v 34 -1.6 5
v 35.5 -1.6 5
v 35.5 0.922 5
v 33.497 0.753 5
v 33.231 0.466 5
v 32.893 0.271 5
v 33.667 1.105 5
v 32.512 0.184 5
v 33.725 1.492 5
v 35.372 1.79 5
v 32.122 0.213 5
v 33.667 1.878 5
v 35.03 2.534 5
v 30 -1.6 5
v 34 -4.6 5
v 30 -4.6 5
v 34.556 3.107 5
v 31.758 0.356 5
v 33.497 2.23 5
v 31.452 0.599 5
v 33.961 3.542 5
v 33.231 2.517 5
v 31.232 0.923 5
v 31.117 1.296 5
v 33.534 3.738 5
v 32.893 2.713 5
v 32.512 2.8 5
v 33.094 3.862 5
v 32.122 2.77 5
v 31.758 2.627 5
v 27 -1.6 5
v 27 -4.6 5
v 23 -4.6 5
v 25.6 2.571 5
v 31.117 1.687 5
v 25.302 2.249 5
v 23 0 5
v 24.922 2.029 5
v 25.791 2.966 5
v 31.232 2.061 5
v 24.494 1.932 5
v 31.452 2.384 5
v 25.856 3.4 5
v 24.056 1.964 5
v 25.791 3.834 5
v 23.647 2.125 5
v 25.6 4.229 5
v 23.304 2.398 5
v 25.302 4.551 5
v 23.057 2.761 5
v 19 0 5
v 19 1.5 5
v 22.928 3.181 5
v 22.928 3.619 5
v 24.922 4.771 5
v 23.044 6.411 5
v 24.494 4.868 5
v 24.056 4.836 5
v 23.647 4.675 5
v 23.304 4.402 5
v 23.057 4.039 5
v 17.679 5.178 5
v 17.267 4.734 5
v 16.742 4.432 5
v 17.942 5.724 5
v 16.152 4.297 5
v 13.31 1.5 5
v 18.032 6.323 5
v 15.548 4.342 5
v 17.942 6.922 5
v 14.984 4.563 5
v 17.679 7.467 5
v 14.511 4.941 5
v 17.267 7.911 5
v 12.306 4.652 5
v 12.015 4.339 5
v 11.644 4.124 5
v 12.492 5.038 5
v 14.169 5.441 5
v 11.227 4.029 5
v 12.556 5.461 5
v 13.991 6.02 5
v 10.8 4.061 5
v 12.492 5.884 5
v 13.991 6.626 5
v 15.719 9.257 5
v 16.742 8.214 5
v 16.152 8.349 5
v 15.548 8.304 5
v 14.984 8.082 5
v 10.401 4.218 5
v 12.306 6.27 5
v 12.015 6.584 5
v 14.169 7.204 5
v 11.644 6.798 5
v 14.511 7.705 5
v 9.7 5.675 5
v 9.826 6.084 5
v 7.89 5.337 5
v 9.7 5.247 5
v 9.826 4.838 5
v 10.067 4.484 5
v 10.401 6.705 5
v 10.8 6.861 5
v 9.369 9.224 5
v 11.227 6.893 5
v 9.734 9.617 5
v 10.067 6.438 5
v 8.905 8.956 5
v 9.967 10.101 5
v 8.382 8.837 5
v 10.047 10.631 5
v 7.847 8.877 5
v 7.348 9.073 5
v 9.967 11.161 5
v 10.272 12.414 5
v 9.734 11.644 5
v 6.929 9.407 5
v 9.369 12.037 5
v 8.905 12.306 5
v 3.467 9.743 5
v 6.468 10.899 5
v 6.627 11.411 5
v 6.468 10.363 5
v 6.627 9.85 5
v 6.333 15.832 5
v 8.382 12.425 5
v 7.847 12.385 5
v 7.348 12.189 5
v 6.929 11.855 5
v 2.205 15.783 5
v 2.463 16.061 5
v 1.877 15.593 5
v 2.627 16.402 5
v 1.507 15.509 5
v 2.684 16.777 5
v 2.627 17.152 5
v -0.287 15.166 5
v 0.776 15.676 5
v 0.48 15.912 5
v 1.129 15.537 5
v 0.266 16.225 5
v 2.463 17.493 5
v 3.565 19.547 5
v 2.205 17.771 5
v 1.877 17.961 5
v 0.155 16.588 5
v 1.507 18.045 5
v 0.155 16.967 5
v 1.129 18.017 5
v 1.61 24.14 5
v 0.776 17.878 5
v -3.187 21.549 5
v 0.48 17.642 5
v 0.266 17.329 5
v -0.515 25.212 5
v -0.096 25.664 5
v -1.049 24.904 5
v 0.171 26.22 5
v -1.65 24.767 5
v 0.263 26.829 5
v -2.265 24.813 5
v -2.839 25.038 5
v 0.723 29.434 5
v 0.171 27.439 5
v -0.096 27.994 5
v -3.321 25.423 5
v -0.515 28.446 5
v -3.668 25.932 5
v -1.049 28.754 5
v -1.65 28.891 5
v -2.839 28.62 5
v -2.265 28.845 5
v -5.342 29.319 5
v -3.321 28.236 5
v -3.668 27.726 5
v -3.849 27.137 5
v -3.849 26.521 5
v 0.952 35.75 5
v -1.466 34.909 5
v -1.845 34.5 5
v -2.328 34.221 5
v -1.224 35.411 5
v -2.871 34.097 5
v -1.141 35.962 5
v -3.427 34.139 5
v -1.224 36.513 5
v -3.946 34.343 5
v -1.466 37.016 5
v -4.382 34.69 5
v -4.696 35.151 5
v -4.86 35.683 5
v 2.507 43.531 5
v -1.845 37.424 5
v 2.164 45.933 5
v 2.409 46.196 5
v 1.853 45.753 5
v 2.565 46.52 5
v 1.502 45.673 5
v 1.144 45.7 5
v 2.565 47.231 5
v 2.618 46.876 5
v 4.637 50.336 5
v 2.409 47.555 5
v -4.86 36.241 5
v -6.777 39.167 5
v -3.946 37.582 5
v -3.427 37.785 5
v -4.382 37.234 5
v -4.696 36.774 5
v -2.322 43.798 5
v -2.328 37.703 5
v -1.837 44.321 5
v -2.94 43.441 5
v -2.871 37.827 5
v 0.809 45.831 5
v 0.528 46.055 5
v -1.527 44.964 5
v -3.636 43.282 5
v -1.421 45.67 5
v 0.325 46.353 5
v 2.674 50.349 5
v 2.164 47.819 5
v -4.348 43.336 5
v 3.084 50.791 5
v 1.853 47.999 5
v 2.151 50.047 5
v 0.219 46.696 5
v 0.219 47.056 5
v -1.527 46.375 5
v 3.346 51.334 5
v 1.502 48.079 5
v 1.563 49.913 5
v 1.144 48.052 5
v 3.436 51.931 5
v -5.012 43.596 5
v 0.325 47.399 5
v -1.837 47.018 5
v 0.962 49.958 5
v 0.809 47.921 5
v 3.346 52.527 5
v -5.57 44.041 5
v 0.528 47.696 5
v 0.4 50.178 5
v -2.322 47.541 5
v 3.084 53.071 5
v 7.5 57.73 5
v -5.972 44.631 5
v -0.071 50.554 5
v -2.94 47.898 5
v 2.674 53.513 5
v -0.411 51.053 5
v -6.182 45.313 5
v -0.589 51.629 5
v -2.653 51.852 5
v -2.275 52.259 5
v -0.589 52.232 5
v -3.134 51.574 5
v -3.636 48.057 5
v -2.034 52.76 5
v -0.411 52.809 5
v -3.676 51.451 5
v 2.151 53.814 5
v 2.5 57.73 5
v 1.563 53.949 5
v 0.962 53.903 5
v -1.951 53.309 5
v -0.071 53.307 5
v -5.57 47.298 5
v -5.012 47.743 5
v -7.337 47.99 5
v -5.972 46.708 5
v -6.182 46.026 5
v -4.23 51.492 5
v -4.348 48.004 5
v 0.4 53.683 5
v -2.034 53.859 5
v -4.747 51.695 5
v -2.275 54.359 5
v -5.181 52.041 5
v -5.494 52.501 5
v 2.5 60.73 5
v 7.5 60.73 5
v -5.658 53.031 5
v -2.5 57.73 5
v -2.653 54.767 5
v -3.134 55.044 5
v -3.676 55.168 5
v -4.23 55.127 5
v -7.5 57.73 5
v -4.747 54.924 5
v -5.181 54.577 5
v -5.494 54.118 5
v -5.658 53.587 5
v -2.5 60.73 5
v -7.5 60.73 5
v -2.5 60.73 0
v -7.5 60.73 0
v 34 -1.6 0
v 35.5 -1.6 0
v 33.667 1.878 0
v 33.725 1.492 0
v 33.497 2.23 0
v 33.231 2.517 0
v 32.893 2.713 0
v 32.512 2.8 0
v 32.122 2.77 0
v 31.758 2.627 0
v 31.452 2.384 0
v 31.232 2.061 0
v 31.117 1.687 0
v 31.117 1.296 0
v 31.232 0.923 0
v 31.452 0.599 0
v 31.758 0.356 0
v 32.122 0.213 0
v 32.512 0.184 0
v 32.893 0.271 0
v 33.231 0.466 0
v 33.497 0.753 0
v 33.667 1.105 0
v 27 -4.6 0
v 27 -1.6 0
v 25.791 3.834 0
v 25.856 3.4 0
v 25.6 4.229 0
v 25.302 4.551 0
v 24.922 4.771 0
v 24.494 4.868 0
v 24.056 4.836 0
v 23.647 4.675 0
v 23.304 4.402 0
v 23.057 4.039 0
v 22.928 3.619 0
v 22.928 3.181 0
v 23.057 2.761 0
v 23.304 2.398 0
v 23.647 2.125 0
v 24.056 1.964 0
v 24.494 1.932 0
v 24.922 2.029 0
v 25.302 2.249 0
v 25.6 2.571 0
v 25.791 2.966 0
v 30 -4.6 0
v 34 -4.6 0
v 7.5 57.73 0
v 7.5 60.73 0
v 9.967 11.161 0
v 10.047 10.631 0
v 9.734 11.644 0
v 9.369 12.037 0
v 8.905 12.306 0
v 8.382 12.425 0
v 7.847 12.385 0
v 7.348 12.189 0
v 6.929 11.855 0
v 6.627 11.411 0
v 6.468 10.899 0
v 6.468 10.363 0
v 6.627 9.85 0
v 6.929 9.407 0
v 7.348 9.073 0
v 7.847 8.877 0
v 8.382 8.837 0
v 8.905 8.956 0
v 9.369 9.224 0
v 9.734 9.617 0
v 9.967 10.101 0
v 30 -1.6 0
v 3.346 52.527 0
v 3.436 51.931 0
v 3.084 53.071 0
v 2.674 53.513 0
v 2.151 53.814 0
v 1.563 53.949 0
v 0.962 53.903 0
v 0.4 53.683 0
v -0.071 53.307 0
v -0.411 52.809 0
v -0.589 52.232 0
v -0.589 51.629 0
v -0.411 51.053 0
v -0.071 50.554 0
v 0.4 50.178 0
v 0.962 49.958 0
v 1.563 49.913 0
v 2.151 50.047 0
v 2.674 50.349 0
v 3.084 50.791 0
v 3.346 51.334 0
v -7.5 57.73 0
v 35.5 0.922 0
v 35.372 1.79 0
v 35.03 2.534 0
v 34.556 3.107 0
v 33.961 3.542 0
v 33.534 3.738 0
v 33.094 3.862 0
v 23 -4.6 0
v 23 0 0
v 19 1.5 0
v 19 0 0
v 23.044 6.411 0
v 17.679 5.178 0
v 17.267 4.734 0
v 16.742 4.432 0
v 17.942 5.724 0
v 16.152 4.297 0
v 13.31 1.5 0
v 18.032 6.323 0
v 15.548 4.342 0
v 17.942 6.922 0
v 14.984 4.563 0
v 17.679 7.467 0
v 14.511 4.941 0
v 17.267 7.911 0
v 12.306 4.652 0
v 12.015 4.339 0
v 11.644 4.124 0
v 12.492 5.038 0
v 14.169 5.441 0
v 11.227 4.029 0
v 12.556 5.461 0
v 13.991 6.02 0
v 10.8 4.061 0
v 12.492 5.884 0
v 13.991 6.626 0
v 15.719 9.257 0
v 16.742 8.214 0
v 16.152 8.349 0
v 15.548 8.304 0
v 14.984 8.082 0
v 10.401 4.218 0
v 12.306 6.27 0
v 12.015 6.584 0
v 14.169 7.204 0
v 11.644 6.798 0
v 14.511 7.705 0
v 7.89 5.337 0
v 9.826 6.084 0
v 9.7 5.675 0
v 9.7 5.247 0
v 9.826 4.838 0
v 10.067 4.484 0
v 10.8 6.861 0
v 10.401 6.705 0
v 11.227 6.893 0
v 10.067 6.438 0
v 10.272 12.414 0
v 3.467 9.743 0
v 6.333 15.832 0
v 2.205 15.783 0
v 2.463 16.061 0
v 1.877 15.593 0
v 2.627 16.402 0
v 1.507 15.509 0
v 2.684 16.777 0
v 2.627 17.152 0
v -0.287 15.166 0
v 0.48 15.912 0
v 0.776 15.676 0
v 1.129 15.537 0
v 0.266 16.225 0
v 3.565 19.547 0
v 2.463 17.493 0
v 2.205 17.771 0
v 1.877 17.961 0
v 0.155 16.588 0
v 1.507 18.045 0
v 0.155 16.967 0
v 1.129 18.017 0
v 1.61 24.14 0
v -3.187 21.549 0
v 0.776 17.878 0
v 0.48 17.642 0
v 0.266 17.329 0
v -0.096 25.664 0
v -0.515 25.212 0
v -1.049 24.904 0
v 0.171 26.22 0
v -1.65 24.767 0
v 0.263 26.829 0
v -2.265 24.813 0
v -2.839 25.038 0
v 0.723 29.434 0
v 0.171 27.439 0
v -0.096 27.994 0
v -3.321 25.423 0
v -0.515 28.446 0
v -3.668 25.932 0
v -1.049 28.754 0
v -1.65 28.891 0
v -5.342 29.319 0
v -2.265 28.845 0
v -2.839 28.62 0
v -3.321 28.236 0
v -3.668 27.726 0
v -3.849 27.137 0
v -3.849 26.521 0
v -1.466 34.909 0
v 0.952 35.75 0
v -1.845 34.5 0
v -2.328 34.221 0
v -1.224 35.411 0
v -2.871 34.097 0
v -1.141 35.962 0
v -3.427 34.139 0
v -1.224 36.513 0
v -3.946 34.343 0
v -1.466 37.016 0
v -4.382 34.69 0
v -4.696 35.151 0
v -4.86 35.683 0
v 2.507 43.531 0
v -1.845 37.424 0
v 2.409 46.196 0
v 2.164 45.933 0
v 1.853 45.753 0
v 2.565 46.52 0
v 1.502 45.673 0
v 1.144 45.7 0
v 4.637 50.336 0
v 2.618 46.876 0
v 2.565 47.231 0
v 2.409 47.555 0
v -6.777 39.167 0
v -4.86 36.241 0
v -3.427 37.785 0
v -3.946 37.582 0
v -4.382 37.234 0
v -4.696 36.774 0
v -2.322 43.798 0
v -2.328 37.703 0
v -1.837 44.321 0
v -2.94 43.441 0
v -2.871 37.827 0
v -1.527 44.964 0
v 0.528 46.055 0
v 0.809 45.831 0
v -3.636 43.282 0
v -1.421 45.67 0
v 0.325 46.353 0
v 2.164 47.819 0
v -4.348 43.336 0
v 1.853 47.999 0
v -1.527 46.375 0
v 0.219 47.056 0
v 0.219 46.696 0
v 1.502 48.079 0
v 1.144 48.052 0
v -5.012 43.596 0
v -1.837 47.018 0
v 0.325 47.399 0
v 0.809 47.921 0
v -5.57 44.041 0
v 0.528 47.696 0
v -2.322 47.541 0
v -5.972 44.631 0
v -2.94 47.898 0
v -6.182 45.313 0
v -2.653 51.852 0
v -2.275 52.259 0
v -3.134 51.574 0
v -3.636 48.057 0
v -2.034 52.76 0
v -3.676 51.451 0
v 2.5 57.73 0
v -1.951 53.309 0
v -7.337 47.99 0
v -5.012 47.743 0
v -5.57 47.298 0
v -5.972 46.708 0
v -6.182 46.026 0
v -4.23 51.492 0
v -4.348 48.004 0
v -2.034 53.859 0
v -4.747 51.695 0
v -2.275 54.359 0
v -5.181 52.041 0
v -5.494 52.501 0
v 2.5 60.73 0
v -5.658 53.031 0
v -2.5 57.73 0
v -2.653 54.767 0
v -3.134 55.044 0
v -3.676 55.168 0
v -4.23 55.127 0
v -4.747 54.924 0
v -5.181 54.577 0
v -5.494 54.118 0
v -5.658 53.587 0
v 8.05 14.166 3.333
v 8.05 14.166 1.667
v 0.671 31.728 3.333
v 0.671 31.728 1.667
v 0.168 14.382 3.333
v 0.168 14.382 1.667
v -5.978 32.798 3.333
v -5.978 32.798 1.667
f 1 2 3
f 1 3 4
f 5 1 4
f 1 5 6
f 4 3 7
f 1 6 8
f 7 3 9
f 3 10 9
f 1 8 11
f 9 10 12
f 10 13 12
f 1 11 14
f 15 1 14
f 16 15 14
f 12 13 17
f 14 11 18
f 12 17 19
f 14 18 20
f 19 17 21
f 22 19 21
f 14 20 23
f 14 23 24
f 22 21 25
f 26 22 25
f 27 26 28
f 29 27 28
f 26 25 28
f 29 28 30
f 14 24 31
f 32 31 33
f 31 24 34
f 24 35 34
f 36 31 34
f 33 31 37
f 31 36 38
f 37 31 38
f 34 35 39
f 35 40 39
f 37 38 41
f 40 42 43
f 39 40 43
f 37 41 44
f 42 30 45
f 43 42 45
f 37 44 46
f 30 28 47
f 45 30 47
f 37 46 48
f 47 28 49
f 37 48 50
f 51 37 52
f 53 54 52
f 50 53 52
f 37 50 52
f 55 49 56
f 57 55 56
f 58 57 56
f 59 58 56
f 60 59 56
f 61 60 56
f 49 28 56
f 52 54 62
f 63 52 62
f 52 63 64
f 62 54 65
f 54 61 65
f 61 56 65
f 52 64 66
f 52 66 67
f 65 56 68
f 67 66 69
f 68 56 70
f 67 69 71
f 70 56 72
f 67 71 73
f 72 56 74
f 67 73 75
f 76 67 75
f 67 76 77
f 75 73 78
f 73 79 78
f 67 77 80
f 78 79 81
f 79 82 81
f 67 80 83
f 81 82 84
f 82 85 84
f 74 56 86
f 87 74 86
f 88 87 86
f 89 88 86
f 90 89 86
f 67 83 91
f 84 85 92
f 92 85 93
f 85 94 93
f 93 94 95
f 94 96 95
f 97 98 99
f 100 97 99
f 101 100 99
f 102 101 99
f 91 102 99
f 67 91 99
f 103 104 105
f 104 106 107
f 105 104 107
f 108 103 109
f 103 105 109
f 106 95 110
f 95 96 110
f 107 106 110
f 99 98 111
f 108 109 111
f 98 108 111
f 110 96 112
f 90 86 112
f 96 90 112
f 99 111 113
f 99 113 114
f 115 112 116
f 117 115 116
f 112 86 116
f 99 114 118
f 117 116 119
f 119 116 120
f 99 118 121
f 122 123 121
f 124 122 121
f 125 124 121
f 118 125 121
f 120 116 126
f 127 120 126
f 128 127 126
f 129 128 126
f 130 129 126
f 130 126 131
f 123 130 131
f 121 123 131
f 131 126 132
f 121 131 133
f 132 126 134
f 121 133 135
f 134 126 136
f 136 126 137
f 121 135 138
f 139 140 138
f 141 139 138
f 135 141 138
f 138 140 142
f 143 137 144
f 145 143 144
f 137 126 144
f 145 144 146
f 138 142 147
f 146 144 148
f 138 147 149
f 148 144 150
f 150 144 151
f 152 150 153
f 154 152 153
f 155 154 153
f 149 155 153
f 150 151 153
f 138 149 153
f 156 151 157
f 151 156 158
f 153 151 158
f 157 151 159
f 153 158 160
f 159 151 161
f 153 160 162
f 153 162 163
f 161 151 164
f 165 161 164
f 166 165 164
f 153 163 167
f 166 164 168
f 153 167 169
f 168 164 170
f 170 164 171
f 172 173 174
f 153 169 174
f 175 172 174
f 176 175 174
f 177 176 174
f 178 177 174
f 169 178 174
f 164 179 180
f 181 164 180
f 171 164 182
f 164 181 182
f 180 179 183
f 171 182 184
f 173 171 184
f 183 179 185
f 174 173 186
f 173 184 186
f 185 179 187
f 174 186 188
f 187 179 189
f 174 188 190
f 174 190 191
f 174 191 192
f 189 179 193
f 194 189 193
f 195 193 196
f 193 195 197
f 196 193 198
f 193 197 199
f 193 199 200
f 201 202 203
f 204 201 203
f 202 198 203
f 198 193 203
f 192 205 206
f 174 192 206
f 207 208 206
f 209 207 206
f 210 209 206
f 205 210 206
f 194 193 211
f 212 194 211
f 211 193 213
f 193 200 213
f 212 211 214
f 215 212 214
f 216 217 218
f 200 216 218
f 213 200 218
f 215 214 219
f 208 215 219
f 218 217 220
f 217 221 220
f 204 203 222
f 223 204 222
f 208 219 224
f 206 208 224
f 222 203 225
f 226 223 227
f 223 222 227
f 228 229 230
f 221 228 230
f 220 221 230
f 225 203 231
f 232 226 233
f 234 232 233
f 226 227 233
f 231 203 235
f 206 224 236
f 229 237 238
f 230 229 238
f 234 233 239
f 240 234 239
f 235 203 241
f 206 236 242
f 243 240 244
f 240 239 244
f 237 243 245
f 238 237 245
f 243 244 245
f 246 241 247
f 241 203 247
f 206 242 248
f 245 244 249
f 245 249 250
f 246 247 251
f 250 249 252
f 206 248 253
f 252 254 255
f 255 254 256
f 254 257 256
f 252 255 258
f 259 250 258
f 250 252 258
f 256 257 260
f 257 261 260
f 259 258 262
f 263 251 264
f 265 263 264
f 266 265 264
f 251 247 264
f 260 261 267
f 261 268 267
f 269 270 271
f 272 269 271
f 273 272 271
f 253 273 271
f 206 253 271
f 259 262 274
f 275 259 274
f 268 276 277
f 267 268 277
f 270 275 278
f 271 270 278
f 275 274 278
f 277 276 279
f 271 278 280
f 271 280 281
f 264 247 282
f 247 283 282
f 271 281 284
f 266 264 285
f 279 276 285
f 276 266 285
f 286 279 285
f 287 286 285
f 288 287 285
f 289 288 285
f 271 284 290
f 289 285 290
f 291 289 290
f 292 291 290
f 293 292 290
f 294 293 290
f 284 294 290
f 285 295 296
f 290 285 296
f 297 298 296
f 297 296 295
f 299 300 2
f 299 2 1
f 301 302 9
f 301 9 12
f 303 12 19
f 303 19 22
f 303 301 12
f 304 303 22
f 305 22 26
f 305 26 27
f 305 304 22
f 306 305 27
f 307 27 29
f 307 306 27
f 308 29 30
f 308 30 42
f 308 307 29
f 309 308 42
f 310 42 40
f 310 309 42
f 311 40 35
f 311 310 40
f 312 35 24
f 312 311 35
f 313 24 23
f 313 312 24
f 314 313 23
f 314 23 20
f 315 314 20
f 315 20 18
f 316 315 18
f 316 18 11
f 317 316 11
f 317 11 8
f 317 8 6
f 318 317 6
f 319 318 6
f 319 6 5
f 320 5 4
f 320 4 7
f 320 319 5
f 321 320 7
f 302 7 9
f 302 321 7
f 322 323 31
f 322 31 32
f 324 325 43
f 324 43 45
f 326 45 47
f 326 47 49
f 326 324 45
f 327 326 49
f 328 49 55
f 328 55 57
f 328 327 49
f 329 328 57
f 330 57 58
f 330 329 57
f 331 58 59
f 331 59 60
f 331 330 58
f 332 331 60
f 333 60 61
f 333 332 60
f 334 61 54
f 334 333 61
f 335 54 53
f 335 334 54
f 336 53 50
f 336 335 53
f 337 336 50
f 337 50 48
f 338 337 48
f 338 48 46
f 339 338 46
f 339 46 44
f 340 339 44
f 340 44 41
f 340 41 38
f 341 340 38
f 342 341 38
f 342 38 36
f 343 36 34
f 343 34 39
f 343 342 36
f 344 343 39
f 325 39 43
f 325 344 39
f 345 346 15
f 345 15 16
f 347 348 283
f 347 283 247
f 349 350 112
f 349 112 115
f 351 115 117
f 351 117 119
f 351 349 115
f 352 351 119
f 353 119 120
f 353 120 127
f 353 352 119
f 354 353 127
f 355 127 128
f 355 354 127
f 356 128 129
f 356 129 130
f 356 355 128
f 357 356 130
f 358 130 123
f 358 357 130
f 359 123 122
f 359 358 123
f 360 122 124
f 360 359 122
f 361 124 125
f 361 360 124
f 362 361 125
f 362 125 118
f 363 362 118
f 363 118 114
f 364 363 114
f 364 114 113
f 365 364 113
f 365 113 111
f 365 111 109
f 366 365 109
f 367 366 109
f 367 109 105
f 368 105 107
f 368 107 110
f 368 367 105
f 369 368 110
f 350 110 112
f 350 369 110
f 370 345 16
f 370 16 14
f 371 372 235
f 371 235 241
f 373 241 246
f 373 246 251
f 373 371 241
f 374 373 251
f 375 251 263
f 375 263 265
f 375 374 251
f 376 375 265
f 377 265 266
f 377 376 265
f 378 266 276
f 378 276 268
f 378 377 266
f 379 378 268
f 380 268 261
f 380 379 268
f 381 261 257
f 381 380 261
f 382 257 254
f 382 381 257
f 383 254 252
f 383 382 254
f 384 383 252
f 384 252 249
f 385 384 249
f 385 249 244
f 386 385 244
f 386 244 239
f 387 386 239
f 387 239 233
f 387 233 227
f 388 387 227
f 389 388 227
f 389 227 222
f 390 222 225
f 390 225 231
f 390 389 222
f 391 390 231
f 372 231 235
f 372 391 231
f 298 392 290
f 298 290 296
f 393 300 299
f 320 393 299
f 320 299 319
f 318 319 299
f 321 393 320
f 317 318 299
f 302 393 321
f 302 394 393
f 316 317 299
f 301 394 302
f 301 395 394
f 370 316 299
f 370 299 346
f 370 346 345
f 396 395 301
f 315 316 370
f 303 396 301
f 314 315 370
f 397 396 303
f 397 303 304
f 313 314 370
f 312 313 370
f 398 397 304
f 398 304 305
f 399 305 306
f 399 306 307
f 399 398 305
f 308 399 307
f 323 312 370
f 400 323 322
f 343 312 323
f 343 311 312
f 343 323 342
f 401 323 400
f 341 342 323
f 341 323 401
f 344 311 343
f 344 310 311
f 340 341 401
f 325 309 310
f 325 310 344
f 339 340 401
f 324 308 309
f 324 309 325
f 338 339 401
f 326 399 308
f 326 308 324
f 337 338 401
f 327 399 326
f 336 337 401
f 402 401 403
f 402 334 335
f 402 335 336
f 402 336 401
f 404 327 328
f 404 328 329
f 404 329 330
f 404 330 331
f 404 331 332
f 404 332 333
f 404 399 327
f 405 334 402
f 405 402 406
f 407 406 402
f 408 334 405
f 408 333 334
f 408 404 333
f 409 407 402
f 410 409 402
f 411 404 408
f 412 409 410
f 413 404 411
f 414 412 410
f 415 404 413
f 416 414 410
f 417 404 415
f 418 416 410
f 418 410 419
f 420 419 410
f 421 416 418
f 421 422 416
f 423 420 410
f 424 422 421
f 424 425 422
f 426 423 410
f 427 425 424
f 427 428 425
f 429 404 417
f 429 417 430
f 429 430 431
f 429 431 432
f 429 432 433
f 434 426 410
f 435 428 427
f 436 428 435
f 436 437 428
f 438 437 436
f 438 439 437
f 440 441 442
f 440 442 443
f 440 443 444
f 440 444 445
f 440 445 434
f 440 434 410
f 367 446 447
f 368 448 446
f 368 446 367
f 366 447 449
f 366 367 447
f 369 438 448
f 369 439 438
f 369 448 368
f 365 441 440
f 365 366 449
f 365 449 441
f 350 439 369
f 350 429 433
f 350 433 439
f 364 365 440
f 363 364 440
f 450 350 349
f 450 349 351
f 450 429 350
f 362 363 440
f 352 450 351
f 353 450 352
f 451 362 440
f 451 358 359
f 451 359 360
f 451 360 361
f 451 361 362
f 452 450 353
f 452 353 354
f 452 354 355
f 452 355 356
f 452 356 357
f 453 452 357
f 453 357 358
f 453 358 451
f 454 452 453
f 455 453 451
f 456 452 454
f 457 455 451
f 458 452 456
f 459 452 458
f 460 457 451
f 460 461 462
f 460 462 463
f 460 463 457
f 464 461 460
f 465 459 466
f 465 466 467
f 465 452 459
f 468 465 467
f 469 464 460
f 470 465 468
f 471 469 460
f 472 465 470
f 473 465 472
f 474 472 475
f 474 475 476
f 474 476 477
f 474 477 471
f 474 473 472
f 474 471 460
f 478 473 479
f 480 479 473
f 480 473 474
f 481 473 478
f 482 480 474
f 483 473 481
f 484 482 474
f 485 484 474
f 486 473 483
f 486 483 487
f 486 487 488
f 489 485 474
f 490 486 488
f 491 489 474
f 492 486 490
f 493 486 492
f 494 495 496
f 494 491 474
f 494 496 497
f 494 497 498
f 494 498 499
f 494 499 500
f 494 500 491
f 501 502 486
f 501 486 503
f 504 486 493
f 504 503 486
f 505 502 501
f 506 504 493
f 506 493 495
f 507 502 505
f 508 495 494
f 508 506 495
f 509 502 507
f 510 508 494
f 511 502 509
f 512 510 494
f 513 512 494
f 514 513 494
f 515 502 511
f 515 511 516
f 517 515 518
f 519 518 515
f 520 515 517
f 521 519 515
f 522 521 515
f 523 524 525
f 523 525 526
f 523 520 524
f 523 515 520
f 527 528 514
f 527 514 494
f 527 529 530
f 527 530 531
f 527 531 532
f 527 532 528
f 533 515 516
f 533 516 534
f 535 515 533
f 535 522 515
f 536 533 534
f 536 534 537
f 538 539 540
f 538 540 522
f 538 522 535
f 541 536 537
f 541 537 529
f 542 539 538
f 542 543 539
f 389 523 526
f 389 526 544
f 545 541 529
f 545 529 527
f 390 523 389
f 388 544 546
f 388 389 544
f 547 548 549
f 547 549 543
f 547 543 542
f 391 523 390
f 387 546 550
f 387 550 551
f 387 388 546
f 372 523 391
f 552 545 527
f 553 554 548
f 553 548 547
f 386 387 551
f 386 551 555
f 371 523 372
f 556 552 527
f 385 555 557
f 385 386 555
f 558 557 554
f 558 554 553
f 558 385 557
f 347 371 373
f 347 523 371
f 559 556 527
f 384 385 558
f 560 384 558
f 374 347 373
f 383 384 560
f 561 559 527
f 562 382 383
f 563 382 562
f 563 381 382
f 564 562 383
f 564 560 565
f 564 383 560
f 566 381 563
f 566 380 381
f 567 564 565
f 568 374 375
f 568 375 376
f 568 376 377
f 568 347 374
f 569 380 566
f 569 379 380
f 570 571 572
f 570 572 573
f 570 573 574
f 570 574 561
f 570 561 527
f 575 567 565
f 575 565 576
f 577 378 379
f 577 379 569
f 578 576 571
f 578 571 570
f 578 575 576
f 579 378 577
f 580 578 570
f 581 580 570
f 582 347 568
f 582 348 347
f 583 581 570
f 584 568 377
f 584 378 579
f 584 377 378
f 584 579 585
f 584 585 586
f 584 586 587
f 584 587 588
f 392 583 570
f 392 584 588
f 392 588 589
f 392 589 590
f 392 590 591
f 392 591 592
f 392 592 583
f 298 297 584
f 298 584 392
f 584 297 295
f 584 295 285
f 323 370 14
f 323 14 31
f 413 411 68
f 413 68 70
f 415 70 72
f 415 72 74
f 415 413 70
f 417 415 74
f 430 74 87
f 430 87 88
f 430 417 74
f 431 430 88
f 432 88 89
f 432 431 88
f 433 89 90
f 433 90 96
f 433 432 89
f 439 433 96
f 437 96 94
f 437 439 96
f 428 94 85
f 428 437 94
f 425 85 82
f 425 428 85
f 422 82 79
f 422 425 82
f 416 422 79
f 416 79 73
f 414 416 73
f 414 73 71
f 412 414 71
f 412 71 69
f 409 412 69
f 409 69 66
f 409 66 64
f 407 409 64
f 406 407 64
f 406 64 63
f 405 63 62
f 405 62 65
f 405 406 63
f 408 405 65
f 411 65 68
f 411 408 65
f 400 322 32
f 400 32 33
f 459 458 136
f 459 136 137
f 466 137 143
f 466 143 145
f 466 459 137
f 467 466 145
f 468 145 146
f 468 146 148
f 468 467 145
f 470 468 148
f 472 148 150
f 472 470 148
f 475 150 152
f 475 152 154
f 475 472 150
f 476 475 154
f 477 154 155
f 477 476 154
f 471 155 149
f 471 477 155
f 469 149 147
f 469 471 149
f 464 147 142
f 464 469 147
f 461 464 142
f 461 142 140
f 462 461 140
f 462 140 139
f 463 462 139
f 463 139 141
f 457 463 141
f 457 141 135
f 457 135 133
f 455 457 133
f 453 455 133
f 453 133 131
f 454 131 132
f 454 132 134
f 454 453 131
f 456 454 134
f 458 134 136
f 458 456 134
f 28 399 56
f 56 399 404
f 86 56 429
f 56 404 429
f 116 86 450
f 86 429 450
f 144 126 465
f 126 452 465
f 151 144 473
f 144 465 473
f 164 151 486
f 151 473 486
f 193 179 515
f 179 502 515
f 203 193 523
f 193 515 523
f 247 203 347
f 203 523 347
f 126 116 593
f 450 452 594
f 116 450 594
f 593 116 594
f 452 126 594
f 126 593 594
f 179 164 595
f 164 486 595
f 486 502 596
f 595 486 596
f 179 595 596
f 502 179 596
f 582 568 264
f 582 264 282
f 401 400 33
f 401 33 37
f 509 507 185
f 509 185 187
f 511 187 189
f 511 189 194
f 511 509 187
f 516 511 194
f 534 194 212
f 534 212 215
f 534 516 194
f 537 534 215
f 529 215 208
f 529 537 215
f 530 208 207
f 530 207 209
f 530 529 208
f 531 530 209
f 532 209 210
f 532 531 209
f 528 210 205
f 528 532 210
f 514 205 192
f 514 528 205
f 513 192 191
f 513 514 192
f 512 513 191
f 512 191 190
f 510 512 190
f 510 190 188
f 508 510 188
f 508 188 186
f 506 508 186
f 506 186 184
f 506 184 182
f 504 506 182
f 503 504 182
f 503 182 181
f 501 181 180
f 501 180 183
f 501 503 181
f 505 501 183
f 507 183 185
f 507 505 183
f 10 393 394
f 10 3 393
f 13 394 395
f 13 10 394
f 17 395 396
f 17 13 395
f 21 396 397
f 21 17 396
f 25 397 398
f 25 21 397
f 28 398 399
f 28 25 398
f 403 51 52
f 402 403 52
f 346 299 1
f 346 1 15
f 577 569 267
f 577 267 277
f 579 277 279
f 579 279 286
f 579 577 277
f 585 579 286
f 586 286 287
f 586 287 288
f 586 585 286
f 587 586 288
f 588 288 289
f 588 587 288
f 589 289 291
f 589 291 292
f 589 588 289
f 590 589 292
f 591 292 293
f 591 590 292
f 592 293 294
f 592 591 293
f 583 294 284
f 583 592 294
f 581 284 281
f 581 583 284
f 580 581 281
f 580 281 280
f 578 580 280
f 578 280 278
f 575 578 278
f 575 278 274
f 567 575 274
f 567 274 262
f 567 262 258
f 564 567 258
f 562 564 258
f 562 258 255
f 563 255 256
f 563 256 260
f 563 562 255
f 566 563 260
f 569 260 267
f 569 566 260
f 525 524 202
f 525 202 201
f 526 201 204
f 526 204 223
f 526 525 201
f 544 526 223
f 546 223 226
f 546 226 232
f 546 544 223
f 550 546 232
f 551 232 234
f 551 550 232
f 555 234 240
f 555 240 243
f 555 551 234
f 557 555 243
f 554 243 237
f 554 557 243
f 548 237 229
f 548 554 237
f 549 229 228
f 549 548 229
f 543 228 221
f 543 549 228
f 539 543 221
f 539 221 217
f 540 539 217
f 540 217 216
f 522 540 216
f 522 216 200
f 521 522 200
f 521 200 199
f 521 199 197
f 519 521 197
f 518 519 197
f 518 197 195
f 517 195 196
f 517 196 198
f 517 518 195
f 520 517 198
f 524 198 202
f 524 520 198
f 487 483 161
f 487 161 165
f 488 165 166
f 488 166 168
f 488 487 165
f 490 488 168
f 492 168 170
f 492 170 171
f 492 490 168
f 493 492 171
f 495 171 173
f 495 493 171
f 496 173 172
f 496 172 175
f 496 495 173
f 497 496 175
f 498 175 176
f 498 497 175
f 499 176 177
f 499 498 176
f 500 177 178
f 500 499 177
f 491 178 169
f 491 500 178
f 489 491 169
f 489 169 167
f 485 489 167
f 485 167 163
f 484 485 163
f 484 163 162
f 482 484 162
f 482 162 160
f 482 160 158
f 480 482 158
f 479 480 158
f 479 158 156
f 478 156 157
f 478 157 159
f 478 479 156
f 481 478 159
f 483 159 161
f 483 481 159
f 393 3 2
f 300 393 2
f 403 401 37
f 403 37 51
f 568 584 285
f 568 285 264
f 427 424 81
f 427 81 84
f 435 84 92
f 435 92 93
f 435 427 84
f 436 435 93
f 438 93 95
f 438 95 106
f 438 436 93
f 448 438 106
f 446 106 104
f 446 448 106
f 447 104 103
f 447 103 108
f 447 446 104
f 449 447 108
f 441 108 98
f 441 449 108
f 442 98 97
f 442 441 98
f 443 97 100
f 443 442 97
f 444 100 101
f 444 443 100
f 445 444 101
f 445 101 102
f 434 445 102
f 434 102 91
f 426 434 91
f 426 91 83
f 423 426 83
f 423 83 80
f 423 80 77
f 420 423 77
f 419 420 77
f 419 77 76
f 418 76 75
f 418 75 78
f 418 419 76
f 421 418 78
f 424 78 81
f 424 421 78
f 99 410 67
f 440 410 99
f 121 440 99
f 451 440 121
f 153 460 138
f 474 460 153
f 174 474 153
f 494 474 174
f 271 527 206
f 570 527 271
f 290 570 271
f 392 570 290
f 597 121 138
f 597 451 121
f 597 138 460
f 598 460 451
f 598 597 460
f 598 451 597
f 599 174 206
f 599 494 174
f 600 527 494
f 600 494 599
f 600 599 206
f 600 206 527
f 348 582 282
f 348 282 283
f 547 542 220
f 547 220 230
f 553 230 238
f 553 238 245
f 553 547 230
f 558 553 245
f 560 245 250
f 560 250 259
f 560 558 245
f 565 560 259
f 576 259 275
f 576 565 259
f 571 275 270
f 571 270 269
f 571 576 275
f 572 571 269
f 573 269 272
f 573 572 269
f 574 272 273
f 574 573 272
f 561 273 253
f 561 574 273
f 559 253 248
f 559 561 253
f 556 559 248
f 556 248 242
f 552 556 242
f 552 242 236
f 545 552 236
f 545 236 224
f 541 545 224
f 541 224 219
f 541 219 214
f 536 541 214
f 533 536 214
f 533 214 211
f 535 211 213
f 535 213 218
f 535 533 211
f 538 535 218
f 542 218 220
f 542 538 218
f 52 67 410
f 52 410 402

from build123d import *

# Parameters (mm, degrees)
ESQUISSE3_R             = 1.863947
ESQUISSE3_R_2           = 2.023509578
ESQUISSE3_R_3           = 2.393973193
ESQUISSE3_R_4           = 1.206253728
ESQUISSE3_R_5           = 1.870132193
ESQUISSE3_R_6           = 2.067863533
ESQUISSE3_R_7           = 1.271503072
ESQUISSE3_R_8           = 1.799094092
ESQUISSE3_R_9           = 1.436016343
ESQUISSE3_R_10          = 2.031777992
ESQUISSE3_R_11          = 1.472480674
ESQUISSE3_R_12          = 1.31161039
BOSS_EXTRU_1_DEPTH      = 5
ESQUISSE4_W             = 5.690326356
ESQUISSE4_H             = 1.5
ENL_V_MAT_EXTRU_1_DEPTH = 71.522215792
CONG_1_R                = 3


with BuildPart() as part:
    # Esquisse3 → Boss.-Extru.1 (new body)
    with BuildSketch(Plane.XY):
        with BuildLine():
            Line((30, -4.6), (30, -1.6))
            Line((30, -1.6), (27, -1.6))
            Line((27, -1.6), (27, -4.6))
            Line((27, -4.6), (23, -4.6))
            Line((23, -4.6), (23, 0))
            Line((23, 0), (16, 0))
            add(Edge.make_bspline(
                [(16, 0), (-3.777040209, 10.263449678), (-7.5, 27.800800799), (-7.5, 57.73)],
                knots=[0, 0, 0, 0, 1, 1, 1, 1], degree=3))
            Line((-7.5, 57.73), (-7.5, 60.73))
            Line((-7.5, 60.73), (-2.5, 60.73))
            Line((-2.5, 60.73), (-2.5, 57.73))
            Line((-2.5, 57.73), (0, 57.73))
            Line((0, 57.73), (2.5, 57.73))
            Line((2.5, 57.73), (2.5, 60.73))
            Line((2.5, 60.73), (7.5, 60.73))
            Line((7.5, 60.73), (7.5, 57.73))
            add(Edge.make_bspline(
                [(35.5, 3.4), (-1.775512635, 10.212780912), (-5.567144123, 26.426699492), (7.5, 57.73)],
                knots=[0, 0, 0, 0, 1, 1, 1, 1], degree=3))
            Line((35.5, 3.4), (35.5, -1.6))
            Line((35.5, -1.6), (34, -1.6))
            Line((34, -1.6), (34, -4.6))
            Line((34, -4.6), (30, -4.6))
        make_face()
        with Locations((-3.815085589, 53.309291012)):
            Circle(ESQUISSE3_R, mode=Mode.SUBTRACT)
        with Locations((1.412013898, 51.930715323)):
            Circle(ESQUISSE3_R_2, mode=Mode.SUBTRACT)
        with Locations((-3.815085589, 45.669684069)):
            Circle(ESQUISSE3_R_3, mode=Mode.SUBTRACT)
        with Locations((1.412013898, 46.875937797)):
            Circle(ESQUISSE3_R_4, mode=Mode.SUBTRACT)
        with Locations((-3.010916437, 35.962213594)):
            Circle(ESQUISSE3_R_5, mode=Mode.SUBTRACT)
        with Locations((-1.804662709, 26.829149655)):
            Circle(ESQUISSE3_R_6, mode=Mode.SUBTRACT)
        with Locations((1.412013898, 16.777035258)):
            Circle(ESQUISSE3_R_7, mode=Mode.SUBTRACT)
        with Locations((8.247451688, 10.630885312)):
            Circle(ESQUISSE3_R_8, mode=Mode.SUBTRACT)
        with Locations((11.119484373, 5.461226479)):
            Circle(ESQUISSE3_R_9, mode=Mode.SUBTRACT)
        with Locations((16, 6.322836284)):
            Circle(ESQUISSE3_R_10, mode=Mode.SUBTRACT)
        with Locations((24.383722678, 3.4)):
            Circle(ESQUISSE3_R_11, mode=Mode.SUBTRACT)
        with Locations((32.413649645, 1.491605314)):
            Circle(ESQUISSE3_R_12, mode=Mode.SUBTRACT)
    extrude(amount=BOSS_EXTRU_1_DEPTH)

    # Esquisse4 → Enlèv. mat.-Extru.1 (cut, through all)
    with BuildSketch(Plane.XY.offset(5)):
        with Locations((16.154836822, 0.75)):
            Rectangle(ESQUISSE4_W, ESQUISSE4_H)
    extrude(amount=-ENL_V_MAT_EXTRU_1_DEPTH, mode=Mode.SUBTRACT)

    # Congé1
    cong_1_edges = [part.edges().sort_by_distance(p)[0] for p in [
        (35.5, 3.4, 2.5),
    ]]
    fillet(cong_1_edges, radius=CONG_1_R)


solid = part.part
